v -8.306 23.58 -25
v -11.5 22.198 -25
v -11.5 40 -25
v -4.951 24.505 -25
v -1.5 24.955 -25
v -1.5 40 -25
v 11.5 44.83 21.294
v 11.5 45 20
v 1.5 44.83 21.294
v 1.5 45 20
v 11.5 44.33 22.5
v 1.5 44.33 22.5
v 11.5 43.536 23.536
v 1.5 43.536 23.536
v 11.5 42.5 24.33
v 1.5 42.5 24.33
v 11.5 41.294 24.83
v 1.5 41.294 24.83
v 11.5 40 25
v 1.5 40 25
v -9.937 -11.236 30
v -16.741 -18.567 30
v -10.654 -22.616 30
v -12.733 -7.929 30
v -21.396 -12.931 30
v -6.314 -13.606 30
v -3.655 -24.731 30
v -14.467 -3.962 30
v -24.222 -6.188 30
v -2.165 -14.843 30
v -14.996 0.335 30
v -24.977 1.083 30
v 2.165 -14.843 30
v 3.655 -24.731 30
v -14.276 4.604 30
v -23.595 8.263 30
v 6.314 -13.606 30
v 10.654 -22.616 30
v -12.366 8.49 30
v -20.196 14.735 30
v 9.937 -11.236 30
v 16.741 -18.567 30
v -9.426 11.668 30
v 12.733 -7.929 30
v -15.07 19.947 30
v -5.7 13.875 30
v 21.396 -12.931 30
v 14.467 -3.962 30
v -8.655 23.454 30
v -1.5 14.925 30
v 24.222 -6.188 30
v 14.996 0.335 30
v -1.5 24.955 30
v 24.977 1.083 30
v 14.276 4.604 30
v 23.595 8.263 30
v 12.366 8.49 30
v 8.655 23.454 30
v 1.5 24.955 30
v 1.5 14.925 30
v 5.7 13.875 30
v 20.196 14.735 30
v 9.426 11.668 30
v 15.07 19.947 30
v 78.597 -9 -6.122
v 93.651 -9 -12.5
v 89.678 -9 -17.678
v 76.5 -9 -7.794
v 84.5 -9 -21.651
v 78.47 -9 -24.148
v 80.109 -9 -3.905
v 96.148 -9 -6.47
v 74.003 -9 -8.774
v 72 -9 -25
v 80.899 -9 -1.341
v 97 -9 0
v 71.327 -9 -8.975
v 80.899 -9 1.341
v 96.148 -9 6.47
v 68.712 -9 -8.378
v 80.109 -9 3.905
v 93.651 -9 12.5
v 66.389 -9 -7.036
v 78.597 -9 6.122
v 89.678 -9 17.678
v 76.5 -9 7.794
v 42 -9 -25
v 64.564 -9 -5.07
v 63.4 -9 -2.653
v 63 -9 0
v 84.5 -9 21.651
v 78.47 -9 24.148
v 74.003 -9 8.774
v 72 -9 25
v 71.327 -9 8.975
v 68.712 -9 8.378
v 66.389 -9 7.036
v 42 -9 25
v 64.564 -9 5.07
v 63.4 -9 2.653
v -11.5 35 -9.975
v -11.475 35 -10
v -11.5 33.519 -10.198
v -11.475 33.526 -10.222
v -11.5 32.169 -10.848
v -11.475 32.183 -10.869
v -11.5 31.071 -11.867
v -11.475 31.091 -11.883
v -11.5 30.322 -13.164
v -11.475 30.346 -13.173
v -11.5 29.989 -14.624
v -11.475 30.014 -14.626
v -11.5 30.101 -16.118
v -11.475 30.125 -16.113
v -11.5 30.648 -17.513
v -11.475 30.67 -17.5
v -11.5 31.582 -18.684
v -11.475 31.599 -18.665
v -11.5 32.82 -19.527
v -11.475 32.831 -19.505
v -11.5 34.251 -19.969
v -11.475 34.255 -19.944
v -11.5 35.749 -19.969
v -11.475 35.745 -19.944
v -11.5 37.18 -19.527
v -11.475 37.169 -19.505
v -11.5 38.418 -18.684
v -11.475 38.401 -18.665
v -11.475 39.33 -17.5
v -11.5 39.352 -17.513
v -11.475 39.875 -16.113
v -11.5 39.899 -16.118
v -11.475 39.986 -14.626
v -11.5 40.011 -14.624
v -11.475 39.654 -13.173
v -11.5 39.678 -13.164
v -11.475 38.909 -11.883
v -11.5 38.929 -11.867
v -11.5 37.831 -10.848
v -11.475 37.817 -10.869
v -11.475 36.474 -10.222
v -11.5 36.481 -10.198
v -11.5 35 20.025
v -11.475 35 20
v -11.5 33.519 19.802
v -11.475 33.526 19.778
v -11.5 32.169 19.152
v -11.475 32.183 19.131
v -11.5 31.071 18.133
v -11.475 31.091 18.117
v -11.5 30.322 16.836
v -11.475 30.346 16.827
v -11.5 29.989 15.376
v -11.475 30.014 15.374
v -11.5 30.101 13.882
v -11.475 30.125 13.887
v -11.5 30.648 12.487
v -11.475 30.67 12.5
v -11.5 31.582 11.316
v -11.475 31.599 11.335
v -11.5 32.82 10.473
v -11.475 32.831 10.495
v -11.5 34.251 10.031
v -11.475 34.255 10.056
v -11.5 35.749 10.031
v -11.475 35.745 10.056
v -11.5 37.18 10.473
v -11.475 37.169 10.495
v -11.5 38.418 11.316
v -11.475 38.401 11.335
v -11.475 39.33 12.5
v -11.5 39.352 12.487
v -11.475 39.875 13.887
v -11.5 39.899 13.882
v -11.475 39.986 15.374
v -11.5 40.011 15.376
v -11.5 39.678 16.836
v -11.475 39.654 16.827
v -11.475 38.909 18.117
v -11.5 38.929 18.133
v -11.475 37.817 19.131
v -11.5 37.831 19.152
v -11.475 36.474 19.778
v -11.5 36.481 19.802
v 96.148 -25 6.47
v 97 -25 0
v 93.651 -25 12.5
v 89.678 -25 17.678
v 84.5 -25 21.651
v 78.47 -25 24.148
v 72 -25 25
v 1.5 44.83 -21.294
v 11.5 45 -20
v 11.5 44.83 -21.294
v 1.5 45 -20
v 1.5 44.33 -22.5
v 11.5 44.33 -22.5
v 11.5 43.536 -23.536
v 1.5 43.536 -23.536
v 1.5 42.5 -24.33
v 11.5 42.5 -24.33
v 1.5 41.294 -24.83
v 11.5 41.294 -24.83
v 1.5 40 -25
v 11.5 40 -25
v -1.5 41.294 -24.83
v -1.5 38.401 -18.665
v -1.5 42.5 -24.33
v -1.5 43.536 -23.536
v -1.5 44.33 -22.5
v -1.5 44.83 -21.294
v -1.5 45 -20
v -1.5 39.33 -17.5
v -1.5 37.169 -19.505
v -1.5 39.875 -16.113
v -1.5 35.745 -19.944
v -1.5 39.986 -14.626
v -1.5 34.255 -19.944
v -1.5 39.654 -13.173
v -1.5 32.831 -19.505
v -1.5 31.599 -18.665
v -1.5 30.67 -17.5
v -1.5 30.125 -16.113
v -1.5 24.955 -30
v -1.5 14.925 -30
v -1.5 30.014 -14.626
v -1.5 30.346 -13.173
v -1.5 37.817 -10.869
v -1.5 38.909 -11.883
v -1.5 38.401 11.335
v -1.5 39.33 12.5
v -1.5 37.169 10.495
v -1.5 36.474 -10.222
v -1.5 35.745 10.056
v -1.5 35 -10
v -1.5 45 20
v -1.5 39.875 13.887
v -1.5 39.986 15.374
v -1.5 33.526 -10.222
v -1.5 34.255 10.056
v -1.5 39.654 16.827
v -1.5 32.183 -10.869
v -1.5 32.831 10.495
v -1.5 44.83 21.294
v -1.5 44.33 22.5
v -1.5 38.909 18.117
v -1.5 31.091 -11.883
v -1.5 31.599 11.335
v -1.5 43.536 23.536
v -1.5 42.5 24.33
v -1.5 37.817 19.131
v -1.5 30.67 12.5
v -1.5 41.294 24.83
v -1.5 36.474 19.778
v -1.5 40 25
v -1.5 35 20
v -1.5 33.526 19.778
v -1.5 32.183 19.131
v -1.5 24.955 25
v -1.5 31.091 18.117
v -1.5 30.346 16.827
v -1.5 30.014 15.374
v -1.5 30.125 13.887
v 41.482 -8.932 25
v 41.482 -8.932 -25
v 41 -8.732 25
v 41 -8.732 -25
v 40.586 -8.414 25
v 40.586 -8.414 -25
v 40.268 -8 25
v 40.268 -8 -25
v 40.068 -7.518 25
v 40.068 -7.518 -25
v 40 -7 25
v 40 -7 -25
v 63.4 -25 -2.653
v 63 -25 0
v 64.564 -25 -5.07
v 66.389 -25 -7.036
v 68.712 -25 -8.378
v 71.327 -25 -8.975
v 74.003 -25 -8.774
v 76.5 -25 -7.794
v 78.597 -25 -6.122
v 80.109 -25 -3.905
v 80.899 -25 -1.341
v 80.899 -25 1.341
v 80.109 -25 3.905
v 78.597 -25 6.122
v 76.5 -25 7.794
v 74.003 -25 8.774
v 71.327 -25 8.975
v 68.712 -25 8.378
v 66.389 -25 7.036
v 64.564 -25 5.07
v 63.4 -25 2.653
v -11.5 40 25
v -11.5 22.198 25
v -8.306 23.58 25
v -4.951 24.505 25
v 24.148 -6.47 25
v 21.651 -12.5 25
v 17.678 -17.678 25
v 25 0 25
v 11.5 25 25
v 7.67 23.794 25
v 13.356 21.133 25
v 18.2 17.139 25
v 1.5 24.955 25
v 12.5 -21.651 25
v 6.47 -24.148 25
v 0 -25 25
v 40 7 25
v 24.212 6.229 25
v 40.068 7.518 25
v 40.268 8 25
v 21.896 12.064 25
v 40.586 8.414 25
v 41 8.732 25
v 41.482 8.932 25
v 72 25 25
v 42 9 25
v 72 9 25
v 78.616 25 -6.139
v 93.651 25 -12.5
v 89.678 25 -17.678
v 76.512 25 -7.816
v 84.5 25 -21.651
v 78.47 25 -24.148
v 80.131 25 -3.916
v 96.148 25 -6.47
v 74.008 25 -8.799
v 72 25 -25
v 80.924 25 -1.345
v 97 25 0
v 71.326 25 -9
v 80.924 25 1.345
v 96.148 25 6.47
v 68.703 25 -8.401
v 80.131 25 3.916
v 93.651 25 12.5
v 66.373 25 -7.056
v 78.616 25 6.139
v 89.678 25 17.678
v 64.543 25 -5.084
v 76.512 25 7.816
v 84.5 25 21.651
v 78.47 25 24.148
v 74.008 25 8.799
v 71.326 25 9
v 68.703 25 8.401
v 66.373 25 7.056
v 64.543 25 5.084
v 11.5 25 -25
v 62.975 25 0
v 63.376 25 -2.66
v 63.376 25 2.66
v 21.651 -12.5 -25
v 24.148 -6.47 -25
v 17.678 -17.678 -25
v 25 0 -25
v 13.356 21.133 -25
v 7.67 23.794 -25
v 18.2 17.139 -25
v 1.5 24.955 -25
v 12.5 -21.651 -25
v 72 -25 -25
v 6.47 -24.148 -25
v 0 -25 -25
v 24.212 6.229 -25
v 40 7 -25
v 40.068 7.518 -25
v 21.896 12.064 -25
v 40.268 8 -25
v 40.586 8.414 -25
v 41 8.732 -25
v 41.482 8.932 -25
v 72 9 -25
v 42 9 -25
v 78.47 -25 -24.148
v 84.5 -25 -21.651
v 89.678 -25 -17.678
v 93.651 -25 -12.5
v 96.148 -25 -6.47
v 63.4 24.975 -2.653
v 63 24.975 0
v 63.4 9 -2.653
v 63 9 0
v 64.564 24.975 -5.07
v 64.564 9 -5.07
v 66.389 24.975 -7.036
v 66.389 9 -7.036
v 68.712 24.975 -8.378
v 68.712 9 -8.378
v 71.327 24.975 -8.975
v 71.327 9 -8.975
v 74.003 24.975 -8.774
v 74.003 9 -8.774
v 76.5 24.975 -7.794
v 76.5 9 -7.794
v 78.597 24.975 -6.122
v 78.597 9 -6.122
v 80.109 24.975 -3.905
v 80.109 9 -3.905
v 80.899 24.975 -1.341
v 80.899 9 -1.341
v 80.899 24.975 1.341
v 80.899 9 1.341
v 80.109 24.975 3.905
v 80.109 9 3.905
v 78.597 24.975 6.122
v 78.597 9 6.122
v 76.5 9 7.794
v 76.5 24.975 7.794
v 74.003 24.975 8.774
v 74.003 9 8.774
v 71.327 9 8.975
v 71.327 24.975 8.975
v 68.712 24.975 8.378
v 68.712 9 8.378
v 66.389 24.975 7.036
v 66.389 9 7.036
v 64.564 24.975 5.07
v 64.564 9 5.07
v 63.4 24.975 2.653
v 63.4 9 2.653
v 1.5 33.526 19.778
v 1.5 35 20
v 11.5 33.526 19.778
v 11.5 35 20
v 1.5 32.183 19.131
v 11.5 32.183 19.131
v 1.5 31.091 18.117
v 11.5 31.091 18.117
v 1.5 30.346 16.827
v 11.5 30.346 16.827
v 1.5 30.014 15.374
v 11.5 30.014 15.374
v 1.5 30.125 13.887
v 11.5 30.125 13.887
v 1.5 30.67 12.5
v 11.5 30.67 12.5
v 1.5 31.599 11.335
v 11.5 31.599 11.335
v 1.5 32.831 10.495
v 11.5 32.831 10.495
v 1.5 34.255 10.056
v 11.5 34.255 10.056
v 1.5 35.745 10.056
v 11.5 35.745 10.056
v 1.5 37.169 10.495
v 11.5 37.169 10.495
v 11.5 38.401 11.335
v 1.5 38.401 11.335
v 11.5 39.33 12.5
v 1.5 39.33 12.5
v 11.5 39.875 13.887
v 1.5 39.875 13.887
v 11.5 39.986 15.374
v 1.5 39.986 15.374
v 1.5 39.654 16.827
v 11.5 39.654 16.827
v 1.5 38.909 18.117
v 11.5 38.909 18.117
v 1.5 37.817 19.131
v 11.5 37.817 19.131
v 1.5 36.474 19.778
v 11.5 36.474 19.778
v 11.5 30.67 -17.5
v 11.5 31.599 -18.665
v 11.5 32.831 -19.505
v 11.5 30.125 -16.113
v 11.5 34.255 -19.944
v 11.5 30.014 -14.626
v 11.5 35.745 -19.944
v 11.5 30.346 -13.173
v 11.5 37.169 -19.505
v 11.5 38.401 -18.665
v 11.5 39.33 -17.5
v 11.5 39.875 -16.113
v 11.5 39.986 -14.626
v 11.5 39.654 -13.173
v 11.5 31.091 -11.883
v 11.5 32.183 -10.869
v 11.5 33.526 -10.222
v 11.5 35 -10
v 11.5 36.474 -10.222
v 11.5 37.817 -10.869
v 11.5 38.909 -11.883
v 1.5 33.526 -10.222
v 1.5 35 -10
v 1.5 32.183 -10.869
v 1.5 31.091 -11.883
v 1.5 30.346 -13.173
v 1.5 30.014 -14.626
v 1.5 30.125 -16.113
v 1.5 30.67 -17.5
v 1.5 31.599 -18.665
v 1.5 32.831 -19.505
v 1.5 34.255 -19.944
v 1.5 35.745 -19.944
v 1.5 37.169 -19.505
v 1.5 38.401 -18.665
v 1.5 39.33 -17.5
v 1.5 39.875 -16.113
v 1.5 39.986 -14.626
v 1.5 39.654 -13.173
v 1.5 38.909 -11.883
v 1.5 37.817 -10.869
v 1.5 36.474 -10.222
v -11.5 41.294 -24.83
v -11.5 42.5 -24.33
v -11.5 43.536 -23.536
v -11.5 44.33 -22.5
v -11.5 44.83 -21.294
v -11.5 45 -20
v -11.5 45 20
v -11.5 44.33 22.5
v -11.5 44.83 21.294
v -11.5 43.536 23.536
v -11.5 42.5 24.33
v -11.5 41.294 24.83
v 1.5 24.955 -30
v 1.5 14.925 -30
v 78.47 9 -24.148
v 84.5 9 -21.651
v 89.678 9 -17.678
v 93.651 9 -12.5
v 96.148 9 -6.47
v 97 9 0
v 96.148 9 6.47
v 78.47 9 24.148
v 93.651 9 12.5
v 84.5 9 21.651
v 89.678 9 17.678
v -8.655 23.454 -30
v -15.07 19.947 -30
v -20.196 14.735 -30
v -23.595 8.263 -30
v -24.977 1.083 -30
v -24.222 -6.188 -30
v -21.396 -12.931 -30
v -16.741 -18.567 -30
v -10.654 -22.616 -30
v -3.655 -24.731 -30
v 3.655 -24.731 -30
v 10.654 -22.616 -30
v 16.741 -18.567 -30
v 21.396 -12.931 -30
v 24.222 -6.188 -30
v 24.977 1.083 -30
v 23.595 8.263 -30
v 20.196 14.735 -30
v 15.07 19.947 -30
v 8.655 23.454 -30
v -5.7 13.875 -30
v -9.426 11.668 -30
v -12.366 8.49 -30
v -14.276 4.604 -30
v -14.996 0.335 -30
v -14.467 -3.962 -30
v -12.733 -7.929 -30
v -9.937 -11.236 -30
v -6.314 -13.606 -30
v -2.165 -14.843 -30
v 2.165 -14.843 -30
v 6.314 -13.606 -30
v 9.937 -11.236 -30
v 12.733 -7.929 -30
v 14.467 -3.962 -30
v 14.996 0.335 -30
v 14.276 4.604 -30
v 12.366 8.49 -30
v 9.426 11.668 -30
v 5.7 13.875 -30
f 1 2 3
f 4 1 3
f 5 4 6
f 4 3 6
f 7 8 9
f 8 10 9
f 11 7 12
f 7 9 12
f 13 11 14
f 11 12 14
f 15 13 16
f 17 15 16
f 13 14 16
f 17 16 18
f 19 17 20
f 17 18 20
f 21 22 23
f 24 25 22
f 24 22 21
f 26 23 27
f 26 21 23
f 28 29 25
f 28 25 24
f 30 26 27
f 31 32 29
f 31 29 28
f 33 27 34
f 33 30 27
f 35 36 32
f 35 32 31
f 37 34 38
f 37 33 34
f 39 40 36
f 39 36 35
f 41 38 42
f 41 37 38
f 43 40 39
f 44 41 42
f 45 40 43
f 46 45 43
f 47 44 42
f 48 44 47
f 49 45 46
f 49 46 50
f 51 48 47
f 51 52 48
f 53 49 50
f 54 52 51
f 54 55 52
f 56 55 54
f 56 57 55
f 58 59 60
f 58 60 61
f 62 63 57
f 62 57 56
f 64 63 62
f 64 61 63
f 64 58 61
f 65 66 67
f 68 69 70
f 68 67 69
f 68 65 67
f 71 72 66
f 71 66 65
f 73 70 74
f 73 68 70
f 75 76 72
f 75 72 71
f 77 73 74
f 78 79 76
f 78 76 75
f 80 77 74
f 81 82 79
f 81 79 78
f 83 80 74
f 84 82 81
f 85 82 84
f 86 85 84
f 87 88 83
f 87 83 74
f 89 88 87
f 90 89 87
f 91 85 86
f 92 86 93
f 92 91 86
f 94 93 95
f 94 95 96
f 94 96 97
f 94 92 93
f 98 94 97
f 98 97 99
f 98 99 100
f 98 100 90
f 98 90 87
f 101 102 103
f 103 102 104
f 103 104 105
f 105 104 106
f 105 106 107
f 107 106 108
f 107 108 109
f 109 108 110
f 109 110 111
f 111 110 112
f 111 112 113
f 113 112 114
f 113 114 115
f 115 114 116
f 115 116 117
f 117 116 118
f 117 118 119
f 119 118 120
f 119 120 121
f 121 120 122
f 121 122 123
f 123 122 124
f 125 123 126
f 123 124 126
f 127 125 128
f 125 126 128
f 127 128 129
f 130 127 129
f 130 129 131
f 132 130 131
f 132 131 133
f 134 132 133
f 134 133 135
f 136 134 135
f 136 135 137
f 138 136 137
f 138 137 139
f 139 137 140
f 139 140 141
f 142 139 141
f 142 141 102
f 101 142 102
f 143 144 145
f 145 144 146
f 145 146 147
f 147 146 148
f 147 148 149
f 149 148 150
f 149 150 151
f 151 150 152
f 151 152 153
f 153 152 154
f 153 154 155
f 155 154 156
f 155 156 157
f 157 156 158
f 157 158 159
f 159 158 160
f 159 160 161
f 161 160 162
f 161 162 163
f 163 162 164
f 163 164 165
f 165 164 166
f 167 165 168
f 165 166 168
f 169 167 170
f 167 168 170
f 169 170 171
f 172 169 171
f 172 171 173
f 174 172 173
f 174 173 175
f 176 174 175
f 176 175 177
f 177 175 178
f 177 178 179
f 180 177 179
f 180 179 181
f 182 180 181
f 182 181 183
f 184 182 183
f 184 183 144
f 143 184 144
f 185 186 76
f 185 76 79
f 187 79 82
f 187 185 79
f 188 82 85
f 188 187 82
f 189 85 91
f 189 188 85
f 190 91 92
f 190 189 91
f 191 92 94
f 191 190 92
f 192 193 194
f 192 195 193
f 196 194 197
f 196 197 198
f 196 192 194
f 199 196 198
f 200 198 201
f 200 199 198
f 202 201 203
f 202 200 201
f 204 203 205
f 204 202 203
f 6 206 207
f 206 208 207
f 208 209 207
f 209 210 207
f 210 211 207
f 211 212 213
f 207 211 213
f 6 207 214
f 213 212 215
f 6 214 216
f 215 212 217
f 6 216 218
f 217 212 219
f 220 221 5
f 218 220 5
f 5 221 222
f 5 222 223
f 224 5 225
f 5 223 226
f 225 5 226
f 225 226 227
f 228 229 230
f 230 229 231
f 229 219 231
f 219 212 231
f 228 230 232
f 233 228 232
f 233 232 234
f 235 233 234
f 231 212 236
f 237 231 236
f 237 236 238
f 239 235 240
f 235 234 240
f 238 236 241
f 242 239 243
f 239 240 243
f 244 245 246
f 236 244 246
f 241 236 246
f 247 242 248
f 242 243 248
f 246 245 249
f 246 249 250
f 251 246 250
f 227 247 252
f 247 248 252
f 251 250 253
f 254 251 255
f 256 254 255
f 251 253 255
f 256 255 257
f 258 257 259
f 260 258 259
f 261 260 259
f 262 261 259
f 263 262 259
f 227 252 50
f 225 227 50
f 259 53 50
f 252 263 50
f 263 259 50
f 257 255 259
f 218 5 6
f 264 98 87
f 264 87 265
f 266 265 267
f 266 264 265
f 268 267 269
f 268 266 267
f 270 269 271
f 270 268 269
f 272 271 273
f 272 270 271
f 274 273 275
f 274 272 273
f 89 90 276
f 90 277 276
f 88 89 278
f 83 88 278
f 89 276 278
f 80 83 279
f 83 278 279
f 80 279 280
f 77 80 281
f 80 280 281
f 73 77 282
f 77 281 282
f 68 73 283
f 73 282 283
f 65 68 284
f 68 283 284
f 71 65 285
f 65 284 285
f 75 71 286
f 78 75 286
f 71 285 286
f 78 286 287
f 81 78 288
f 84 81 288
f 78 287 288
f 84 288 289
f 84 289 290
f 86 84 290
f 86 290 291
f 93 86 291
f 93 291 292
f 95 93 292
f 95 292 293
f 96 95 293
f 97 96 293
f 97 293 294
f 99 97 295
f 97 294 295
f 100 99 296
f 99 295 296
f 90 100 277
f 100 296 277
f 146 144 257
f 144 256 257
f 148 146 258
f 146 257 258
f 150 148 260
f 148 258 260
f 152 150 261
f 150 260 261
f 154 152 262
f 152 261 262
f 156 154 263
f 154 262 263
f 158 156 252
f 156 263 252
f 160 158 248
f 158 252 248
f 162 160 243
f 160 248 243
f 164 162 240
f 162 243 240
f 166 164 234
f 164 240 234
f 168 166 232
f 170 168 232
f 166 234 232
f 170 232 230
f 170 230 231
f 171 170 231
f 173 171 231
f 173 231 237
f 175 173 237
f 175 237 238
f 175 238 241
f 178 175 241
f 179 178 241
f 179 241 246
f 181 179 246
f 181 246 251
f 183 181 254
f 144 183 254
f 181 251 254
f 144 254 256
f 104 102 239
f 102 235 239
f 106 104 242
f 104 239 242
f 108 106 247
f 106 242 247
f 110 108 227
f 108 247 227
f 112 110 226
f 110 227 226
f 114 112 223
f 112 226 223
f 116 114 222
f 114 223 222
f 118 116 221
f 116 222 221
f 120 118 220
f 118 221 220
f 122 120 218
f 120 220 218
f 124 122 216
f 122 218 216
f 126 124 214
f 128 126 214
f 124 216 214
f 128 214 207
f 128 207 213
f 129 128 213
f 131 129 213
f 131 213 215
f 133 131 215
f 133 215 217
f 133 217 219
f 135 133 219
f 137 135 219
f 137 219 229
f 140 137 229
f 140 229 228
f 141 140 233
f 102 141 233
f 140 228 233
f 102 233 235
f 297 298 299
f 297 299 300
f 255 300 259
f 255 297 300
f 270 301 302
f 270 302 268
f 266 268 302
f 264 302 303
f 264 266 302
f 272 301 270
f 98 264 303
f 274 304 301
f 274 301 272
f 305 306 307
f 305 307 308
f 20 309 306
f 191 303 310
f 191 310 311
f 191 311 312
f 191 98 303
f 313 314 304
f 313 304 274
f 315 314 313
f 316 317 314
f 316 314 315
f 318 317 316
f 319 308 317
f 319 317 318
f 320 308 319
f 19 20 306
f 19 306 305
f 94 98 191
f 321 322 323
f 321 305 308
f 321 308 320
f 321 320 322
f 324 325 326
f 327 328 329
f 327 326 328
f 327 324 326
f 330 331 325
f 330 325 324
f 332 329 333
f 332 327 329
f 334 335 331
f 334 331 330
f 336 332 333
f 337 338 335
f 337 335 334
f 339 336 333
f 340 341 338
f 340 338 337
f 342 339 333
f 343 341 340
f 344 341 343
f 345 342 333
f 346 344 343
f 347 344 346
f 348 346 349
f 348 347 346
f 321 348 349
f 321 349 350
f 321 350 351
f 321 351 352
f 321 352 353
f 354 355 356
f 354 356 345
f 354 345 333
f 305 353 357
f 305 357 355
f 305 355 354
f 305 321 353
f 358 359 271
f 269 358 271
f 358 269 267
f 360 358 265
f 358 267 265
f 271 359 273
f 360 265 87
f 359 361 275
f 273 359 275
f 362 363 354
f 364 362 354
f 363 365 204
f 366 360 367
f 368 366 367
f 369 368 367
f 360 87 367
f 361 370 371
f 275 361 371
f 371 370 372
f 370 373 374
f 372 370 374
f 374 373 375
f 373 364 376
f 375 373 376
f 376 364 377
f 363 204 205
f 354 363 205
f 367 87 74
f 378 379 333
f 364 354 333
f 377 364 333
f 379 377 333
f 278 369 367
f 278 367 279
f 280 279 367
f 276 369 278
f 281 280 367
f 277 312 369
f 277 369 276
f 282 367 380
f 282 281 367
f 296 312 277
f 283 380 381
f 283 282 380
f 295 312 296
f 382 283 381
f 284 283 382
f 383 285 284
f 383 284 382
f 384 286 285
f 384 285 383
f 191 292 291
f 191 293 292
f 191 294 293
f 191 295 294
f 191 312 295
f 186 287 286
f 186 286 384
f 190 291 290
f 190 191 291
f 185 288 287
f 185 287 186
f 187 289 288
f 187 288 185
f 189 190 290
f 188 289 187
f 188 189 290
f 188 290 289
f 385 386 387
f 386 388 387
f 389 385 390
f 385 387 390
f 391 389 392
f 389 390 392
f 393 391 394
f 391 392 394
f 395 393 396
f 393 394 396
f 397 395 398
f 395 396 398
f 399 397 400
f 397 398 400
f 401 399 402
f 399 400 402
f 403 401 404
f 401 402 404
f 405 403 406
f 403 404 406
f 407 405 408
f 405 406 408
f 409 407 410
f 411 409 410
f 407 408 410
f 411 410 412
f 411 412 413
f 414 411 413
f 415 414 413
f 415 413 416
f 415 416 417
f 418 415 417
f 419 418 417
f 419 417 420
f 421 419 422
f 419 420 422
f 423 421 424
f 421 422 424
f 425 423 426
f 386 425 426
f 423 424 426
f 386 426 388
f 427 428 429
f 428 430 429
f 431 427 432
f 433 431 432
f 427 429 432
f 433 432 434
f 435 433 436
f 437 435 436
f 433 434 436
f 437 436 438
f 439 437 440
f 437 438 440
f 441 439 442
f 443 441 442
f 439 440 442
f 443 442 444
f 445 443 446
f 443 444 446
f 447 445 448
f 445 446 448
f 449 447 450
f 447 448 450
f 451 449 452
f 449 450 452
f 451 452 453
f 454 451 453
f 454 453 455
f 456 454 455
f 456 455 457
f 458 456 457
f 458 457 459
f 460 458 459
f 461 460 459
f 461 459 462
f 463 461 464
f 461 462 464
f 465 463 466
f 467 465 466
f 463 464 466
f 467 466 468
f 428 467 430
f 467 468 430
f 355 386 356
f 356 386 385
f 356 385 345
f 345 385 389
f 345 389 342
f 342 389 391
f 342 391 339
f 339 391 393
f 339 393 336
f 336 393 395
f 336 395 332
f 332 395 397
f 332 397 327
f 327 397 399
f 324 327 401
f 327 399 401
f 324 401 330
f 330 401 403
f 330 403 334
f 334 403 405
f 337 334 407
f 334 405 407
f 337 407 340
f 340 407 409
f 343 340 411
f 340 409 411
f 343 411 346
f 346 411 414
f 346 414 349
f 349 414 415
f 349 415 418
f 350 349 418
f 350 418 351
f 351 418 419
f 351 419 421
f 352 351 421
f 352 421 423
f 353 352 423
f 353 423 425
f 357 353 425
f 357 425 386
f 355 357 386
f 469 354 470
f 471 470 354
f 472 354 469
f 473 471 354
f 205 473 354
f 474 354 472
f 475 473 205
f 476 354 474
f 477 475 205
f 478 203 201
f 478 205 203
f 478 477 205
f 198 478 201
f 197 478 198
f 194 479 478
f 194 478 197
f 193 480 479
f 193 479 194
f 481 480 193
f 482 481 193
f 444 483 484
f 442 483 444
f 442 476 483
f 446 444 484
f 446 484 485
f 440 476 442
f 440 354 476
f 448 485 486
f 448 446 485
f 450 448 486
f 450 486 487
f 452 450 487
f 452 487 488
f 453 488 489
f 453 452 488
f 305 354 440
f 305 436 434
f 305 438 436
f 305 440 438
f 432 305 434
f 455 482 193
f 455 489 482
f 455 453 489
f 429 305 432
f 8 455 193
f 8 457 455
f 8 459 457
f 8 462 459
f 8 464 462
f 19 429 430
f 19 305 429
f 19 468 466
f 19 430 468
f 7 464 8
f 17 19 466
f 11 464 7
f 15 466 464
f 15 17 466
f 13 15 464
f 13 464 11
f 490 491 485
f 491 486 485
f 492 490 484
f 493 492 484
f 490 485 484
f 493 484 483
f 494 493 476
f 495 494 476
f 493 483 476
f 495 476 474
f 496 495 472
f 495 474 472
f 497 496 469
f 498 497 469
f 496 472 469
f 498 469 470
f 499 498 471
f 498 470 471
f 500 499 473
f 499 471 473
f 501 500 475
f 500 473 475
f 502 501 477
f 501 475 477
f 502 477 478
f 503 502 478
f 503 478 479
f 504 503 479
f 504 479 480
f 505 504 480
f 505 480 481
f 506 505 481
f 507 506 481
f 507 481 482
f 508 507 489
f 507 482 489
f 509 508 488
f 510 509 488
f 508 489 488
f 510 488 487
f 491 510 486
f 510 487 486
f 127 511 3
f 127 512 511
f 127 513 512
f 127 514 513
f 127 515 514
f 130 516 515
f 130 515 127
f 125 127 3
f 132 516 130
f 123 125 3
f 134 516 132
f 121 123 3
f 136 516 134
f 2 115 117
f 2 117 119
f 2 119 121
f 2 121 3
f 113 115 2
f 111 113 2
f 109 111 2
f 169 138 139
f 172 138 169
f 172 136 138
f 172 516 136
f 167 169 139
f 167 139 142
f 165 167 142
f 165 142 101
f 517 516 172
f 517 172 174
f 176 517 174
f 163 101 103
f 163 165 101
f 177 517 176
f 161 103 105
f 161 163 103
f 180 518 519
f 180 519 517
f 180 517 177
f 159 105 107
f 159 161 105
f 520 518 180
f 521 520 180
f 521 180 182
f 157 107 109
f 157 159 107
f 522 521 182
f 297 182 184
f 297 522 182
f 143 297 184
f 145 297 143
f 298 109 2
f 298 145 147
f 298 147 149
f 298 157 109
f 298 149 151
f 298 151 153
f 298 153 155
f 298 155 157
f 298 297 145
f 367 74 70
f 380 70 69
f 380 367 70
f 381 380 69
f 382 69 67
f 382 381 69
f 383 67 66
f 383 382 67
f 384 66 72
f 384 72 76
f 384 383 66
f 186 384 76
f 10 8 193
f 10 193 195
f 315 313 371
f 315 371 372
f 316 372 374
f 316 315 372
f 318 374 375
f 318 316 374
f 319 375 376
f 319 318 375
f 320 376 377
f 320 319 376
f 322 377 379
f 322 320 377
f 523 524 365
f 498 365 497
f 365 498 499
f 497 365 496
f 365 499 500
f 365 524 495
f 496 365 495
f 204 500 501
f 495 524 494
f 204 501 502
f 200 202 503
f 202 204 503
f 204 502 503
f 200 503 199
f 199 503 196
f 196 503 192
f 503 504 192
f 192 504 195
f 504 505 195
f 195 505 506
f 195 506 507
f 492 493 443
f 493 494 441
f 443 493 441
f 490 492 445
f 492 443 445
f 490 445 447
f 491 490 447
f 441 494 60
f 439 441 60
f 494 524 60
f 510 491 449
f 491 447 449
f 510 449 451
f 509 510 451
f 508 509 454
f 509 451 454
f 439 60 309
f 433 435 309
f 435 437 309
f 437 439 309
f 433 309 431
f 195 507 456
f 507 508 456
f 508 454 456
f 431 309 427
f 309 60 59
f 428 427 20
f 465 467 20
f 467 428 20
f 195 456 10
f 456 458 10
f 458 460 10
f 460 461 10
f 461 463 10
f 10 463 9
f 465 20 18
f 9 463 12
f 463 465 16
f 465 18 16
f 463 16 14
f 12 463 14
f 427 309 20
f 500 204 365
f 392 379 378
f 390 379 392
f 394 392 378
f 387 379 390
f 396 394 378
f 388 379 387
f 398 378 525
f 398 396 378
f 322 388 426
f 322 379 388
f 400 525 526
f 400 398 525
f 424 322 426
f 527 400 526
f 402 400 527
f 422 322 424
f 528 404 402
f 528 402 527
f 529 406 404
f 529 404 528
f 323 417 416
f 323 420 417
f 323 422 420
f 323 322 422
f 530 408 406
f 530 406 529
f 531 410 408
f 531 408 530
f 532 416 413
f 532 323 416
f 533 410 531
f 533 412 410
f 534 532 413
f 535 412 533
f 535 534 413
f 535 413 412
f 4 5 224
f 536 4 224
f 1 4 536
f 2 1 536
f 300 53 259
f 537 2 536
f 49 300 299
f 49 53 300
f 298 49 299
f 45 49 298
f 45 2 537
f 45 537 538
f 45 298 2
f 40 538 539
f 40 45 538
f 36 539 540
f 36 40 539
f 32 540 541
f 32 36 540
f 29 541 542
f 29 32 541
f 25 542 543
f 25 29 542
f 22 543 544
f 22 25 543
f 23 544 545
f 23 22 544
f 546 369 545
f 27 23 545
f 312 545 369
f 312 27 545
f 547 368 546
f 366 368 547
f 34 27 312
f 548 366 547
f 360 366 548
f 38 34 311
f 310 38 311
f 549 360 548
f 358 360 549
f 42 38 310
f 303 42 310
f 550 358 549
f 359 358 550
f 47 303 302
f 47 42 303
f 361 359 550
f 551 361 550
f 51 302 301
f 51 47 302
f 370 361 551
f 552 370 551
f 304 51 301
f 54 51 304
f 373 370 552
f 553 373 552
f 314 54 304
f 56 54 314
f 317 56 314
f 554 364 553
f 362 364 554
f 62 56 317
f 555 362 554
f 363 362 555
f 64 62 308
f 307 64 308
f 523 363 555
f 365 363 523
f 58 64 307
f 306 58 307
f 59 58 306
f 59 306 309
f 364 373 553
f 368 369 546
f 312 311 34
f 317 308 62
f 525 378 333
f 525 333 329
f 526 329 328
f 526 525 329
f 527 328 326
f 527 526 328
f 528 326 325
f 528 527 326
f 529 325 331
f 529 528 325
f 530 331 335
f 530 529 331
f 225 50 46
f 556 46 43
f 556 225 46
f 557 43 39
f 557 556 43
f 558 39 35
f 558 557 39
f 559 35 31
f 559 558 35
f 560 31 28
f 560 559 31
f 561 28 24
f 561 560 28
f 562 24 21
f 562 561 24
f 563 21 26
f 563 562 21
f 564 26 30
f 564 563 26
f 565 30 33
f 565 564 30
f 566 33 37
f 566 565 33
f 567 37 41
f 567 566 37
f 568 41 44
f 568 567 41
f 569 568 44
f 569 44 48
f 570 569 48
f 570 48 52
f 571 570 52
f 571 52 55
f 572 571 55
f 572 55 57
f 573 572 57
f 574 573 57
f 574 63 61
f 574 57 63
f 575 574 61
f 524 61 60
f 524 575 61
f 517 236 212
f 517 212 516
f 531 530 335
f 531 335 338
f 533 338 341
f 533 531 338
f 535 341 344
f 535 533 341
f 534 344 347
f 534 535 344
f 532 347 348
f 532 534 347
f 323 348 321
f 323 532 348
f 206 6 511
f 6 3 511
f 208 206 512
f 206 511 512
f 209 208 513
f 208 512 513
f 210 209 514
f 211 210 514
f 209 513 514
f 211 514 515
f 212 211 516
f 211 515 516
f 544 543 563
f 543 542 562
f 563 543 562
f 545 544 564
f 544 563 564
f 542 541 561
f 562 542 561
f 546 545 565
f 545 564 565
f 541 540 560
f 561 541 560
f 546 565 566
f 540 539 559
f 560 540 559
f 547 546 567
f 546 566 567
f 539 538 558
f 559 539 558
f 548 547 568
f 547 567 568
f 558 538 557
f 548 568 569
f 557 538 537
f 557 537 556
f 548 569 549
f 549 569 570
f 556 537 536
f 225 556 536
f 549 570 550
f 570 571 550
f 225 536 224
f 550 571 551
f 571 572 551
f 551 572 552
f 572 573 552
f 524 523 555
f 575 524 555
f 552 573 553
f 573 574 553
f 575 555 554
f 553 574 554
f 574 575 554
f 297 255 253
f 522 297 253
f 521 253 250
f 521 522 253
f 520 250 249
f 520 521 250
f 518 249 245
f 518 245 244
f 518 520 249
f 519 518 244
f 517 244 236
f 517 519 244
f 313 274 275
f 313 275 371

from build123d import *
from OCP.BRepAlgoAPI import BRepAlgoAPI_Cut
from OCP.TopTools import TopTools_ListOfShape

# Parameters (mm, degrees)
SCHIZZO1_R                   = 25
SCHIZZO1_R_2                 = 15
ESTRUSIONE_ESTRUSIONE1_DEPTH = 30
ESTRUSIONE_ESTRUSIONE2_DEPTH = 25
TAGLIO_ESTRUSIONE1_DEPTH     = 123.613212991
FORO_18_0_18_1_D             = 18
FORO_18_0_18_1_CSINK_D       = 18.05
FORO_18_0_18_1_CSINK_ANGLE   = 90
FORO_10_0_10_1_D             = 10
FORO_10_0_10_1_CSINK_D       = 10.05
FORO_10_0_10_1_CSINK_ANGLE   = 90
TAGLIO_ESTRUSIONE2_START     = -51
TAGLIO_ESTRUSIONE2_DEPTH     = 51
RACCORDO1_R                  = 5


with BuildPart() as part:
    # Schizzo1 → Estrusione-Estrusione1 (new, symmetric)
    with BuildSketch(Plane.XY):
        Circle(SCHIZZO1_R)
        Circle(SCHIZZO1_R_2, mode=Mode.SUBTRACT)
    extrude(amount=ESTRUSIONE_ESTRUSIONE1_DEPTH, both=True)

    # Schizzo1<6> → Estrusione-Estrusione2 (add, symmetric)
    with BuildSketch(Plane.XY):
        with BuildLine():
            Line((11.5, 45), (-11.5, 45))
            Line((-11.5, 45), (-11.5, 22.19797288))
            ThreePointArc((-11.5, 22.19797288), (12.990381057, 21.360009363), (25, 0))
            ThreePointArc((25, 0), (17.67766953, -17.67766953), (0, -25))
            Line((0, -25), (97, -25))
            Line((97, -25), (97, -9))
            Line((97, -9), (42, -9))
            ThreePointArc((42, -9), (40.585786438, -8.414213562), (40, -7))
            Line((40, -7), (40, 7))
            ThreePointArc((40, 7), (40.585786438, 8.414213562), (42, 9))
            Line((42, 9), (97, 9))
            Line((97, 9), (97, 25))
            Line((97, 25), (11.5, 25))
            Line((11.5, 25), (11.5, 45))
        make_face()
    extrude(amount=ESTRUSIONE_ESTRUSIONE2_DEPTH, both=True)

    # Schizzo3 → Taglio-Estrusione1 (cut, through all)
    with BuildSketch(Plane.XY.offset(30)):
        Polygon((1.5, 45), (-1.5, 45), (-1.5, 14.924811557), (0, 15), (1.5, 14.924811557), align=None)
    extrude(amount=-TAGLIO_ESTRUSIONE1_DEPTH, mode=Mode.SUBTRACT)

    # Foro Ø18.0 (18)-1 (through all)
    with Locations(Plane(origin=(71.999996961, 25, 6.74e-07), x_dir=(1, 0, 0), z_dir=(0, 1, 0))):
        with Locations((0, 0)):
            CounterSinkHole(FORO_18_0_18_1_D / 2, FORO_18_0_18_1_CSINK_D / 2, counter_sink_angle=FORO_18_0_18_1_CSINK_ANGLE)

    # Foro Ø10.0 (10)-1 (through all)
    with Locations(Plane(origin=(-11.5, 35, 15), x_dir=(0, 0, -1), z_dir=(-1, 0, 0))):
        with Locations((0, 0), (30, 0)):
            CounterSinkHole(FORO_10_0_10_1_D / 2, FORO_10_0_10_1_CSINK_D / 2, counter_sink_angle=FORO_10_0_10_1_CSINK_ANGLE)


with BuildPart() as taglio_estrusione2_tool:
    # Taglio-Estrusione2: read off the stored shape, not the designer's step
    # Taglio-Estrusione2 outline → Taglio-Estrusione2 (new body)
    with BuildSketch(Plane(origin=(0, 25, 0), x_dir=(1, 0, 0), z_dir=(0, 1, 0)).offset(TAGLIO_ESTRUSIONE2_START)):
        with BuildLine():
            Line((97, 25), (71.999996961, 25))
            ThreePointArc((71.999996961, 25), (89.677666491, 17.67766953), (96.999996961, 0))
            Line((96.999996961, 0), (97, 25))
        make_face()
        with BuildLine():
            Line((97, -25), (96.999996961, 0))
            ThreePointArc((96.999996961, 0), (89.677666491, -17.67766953), (71.999996961, -25))
            Line((71.999996961, -25), (97, -25))
        make_face()
    extrude(amount=TAGLIO_ESTRUSIONE2_DEPTH)


with BuildPart() as part_1:
    add(part.part)

    # Taglio-Estrusione2: cut by taglio_estrusione2_tool, with a tolerance
    taglio_estrusione2_stock = TopTools_ListOfShape()
    taglio_estrusione2_stock.Append(part_1.part.wrapped)
    taglio_estrusione2_tools = TopTools_ListOfShape()
    taglio_estrusione2_tools.Append(taglio_estrusione2_tool.part.wrapped)
    taglio_estrusione2_cut = BRepAlgoAPI_Cut()
    taglio_estrusione2_cut.SetArguments(taglio_estrusione2_stock)
    taglio_estrusione2_cut.SetTools(taglio_estrusione2_tools)
    taglio_estrusione2_cut.SetFuzzyValue(0.00001)
    taglio_estrusione2_cut.Build()
    add(Compound.cast(taglio_estrusione2_cut.Shape()).solids(), mode=Mode.REPLACE)

    # Raccordo1
    raccordo1_edges = [part_1.edges().sort_by_distance(p)[0] for p in [
        (-6.5, 45, 25),
        (-6.5, 45, -25),
        (6.5, 45, -25),
        (6.5, 45, 25),
    ]]
    fillet(raccordo1_edges, radius=RACCORDO1_R)


solid = part_1.part
